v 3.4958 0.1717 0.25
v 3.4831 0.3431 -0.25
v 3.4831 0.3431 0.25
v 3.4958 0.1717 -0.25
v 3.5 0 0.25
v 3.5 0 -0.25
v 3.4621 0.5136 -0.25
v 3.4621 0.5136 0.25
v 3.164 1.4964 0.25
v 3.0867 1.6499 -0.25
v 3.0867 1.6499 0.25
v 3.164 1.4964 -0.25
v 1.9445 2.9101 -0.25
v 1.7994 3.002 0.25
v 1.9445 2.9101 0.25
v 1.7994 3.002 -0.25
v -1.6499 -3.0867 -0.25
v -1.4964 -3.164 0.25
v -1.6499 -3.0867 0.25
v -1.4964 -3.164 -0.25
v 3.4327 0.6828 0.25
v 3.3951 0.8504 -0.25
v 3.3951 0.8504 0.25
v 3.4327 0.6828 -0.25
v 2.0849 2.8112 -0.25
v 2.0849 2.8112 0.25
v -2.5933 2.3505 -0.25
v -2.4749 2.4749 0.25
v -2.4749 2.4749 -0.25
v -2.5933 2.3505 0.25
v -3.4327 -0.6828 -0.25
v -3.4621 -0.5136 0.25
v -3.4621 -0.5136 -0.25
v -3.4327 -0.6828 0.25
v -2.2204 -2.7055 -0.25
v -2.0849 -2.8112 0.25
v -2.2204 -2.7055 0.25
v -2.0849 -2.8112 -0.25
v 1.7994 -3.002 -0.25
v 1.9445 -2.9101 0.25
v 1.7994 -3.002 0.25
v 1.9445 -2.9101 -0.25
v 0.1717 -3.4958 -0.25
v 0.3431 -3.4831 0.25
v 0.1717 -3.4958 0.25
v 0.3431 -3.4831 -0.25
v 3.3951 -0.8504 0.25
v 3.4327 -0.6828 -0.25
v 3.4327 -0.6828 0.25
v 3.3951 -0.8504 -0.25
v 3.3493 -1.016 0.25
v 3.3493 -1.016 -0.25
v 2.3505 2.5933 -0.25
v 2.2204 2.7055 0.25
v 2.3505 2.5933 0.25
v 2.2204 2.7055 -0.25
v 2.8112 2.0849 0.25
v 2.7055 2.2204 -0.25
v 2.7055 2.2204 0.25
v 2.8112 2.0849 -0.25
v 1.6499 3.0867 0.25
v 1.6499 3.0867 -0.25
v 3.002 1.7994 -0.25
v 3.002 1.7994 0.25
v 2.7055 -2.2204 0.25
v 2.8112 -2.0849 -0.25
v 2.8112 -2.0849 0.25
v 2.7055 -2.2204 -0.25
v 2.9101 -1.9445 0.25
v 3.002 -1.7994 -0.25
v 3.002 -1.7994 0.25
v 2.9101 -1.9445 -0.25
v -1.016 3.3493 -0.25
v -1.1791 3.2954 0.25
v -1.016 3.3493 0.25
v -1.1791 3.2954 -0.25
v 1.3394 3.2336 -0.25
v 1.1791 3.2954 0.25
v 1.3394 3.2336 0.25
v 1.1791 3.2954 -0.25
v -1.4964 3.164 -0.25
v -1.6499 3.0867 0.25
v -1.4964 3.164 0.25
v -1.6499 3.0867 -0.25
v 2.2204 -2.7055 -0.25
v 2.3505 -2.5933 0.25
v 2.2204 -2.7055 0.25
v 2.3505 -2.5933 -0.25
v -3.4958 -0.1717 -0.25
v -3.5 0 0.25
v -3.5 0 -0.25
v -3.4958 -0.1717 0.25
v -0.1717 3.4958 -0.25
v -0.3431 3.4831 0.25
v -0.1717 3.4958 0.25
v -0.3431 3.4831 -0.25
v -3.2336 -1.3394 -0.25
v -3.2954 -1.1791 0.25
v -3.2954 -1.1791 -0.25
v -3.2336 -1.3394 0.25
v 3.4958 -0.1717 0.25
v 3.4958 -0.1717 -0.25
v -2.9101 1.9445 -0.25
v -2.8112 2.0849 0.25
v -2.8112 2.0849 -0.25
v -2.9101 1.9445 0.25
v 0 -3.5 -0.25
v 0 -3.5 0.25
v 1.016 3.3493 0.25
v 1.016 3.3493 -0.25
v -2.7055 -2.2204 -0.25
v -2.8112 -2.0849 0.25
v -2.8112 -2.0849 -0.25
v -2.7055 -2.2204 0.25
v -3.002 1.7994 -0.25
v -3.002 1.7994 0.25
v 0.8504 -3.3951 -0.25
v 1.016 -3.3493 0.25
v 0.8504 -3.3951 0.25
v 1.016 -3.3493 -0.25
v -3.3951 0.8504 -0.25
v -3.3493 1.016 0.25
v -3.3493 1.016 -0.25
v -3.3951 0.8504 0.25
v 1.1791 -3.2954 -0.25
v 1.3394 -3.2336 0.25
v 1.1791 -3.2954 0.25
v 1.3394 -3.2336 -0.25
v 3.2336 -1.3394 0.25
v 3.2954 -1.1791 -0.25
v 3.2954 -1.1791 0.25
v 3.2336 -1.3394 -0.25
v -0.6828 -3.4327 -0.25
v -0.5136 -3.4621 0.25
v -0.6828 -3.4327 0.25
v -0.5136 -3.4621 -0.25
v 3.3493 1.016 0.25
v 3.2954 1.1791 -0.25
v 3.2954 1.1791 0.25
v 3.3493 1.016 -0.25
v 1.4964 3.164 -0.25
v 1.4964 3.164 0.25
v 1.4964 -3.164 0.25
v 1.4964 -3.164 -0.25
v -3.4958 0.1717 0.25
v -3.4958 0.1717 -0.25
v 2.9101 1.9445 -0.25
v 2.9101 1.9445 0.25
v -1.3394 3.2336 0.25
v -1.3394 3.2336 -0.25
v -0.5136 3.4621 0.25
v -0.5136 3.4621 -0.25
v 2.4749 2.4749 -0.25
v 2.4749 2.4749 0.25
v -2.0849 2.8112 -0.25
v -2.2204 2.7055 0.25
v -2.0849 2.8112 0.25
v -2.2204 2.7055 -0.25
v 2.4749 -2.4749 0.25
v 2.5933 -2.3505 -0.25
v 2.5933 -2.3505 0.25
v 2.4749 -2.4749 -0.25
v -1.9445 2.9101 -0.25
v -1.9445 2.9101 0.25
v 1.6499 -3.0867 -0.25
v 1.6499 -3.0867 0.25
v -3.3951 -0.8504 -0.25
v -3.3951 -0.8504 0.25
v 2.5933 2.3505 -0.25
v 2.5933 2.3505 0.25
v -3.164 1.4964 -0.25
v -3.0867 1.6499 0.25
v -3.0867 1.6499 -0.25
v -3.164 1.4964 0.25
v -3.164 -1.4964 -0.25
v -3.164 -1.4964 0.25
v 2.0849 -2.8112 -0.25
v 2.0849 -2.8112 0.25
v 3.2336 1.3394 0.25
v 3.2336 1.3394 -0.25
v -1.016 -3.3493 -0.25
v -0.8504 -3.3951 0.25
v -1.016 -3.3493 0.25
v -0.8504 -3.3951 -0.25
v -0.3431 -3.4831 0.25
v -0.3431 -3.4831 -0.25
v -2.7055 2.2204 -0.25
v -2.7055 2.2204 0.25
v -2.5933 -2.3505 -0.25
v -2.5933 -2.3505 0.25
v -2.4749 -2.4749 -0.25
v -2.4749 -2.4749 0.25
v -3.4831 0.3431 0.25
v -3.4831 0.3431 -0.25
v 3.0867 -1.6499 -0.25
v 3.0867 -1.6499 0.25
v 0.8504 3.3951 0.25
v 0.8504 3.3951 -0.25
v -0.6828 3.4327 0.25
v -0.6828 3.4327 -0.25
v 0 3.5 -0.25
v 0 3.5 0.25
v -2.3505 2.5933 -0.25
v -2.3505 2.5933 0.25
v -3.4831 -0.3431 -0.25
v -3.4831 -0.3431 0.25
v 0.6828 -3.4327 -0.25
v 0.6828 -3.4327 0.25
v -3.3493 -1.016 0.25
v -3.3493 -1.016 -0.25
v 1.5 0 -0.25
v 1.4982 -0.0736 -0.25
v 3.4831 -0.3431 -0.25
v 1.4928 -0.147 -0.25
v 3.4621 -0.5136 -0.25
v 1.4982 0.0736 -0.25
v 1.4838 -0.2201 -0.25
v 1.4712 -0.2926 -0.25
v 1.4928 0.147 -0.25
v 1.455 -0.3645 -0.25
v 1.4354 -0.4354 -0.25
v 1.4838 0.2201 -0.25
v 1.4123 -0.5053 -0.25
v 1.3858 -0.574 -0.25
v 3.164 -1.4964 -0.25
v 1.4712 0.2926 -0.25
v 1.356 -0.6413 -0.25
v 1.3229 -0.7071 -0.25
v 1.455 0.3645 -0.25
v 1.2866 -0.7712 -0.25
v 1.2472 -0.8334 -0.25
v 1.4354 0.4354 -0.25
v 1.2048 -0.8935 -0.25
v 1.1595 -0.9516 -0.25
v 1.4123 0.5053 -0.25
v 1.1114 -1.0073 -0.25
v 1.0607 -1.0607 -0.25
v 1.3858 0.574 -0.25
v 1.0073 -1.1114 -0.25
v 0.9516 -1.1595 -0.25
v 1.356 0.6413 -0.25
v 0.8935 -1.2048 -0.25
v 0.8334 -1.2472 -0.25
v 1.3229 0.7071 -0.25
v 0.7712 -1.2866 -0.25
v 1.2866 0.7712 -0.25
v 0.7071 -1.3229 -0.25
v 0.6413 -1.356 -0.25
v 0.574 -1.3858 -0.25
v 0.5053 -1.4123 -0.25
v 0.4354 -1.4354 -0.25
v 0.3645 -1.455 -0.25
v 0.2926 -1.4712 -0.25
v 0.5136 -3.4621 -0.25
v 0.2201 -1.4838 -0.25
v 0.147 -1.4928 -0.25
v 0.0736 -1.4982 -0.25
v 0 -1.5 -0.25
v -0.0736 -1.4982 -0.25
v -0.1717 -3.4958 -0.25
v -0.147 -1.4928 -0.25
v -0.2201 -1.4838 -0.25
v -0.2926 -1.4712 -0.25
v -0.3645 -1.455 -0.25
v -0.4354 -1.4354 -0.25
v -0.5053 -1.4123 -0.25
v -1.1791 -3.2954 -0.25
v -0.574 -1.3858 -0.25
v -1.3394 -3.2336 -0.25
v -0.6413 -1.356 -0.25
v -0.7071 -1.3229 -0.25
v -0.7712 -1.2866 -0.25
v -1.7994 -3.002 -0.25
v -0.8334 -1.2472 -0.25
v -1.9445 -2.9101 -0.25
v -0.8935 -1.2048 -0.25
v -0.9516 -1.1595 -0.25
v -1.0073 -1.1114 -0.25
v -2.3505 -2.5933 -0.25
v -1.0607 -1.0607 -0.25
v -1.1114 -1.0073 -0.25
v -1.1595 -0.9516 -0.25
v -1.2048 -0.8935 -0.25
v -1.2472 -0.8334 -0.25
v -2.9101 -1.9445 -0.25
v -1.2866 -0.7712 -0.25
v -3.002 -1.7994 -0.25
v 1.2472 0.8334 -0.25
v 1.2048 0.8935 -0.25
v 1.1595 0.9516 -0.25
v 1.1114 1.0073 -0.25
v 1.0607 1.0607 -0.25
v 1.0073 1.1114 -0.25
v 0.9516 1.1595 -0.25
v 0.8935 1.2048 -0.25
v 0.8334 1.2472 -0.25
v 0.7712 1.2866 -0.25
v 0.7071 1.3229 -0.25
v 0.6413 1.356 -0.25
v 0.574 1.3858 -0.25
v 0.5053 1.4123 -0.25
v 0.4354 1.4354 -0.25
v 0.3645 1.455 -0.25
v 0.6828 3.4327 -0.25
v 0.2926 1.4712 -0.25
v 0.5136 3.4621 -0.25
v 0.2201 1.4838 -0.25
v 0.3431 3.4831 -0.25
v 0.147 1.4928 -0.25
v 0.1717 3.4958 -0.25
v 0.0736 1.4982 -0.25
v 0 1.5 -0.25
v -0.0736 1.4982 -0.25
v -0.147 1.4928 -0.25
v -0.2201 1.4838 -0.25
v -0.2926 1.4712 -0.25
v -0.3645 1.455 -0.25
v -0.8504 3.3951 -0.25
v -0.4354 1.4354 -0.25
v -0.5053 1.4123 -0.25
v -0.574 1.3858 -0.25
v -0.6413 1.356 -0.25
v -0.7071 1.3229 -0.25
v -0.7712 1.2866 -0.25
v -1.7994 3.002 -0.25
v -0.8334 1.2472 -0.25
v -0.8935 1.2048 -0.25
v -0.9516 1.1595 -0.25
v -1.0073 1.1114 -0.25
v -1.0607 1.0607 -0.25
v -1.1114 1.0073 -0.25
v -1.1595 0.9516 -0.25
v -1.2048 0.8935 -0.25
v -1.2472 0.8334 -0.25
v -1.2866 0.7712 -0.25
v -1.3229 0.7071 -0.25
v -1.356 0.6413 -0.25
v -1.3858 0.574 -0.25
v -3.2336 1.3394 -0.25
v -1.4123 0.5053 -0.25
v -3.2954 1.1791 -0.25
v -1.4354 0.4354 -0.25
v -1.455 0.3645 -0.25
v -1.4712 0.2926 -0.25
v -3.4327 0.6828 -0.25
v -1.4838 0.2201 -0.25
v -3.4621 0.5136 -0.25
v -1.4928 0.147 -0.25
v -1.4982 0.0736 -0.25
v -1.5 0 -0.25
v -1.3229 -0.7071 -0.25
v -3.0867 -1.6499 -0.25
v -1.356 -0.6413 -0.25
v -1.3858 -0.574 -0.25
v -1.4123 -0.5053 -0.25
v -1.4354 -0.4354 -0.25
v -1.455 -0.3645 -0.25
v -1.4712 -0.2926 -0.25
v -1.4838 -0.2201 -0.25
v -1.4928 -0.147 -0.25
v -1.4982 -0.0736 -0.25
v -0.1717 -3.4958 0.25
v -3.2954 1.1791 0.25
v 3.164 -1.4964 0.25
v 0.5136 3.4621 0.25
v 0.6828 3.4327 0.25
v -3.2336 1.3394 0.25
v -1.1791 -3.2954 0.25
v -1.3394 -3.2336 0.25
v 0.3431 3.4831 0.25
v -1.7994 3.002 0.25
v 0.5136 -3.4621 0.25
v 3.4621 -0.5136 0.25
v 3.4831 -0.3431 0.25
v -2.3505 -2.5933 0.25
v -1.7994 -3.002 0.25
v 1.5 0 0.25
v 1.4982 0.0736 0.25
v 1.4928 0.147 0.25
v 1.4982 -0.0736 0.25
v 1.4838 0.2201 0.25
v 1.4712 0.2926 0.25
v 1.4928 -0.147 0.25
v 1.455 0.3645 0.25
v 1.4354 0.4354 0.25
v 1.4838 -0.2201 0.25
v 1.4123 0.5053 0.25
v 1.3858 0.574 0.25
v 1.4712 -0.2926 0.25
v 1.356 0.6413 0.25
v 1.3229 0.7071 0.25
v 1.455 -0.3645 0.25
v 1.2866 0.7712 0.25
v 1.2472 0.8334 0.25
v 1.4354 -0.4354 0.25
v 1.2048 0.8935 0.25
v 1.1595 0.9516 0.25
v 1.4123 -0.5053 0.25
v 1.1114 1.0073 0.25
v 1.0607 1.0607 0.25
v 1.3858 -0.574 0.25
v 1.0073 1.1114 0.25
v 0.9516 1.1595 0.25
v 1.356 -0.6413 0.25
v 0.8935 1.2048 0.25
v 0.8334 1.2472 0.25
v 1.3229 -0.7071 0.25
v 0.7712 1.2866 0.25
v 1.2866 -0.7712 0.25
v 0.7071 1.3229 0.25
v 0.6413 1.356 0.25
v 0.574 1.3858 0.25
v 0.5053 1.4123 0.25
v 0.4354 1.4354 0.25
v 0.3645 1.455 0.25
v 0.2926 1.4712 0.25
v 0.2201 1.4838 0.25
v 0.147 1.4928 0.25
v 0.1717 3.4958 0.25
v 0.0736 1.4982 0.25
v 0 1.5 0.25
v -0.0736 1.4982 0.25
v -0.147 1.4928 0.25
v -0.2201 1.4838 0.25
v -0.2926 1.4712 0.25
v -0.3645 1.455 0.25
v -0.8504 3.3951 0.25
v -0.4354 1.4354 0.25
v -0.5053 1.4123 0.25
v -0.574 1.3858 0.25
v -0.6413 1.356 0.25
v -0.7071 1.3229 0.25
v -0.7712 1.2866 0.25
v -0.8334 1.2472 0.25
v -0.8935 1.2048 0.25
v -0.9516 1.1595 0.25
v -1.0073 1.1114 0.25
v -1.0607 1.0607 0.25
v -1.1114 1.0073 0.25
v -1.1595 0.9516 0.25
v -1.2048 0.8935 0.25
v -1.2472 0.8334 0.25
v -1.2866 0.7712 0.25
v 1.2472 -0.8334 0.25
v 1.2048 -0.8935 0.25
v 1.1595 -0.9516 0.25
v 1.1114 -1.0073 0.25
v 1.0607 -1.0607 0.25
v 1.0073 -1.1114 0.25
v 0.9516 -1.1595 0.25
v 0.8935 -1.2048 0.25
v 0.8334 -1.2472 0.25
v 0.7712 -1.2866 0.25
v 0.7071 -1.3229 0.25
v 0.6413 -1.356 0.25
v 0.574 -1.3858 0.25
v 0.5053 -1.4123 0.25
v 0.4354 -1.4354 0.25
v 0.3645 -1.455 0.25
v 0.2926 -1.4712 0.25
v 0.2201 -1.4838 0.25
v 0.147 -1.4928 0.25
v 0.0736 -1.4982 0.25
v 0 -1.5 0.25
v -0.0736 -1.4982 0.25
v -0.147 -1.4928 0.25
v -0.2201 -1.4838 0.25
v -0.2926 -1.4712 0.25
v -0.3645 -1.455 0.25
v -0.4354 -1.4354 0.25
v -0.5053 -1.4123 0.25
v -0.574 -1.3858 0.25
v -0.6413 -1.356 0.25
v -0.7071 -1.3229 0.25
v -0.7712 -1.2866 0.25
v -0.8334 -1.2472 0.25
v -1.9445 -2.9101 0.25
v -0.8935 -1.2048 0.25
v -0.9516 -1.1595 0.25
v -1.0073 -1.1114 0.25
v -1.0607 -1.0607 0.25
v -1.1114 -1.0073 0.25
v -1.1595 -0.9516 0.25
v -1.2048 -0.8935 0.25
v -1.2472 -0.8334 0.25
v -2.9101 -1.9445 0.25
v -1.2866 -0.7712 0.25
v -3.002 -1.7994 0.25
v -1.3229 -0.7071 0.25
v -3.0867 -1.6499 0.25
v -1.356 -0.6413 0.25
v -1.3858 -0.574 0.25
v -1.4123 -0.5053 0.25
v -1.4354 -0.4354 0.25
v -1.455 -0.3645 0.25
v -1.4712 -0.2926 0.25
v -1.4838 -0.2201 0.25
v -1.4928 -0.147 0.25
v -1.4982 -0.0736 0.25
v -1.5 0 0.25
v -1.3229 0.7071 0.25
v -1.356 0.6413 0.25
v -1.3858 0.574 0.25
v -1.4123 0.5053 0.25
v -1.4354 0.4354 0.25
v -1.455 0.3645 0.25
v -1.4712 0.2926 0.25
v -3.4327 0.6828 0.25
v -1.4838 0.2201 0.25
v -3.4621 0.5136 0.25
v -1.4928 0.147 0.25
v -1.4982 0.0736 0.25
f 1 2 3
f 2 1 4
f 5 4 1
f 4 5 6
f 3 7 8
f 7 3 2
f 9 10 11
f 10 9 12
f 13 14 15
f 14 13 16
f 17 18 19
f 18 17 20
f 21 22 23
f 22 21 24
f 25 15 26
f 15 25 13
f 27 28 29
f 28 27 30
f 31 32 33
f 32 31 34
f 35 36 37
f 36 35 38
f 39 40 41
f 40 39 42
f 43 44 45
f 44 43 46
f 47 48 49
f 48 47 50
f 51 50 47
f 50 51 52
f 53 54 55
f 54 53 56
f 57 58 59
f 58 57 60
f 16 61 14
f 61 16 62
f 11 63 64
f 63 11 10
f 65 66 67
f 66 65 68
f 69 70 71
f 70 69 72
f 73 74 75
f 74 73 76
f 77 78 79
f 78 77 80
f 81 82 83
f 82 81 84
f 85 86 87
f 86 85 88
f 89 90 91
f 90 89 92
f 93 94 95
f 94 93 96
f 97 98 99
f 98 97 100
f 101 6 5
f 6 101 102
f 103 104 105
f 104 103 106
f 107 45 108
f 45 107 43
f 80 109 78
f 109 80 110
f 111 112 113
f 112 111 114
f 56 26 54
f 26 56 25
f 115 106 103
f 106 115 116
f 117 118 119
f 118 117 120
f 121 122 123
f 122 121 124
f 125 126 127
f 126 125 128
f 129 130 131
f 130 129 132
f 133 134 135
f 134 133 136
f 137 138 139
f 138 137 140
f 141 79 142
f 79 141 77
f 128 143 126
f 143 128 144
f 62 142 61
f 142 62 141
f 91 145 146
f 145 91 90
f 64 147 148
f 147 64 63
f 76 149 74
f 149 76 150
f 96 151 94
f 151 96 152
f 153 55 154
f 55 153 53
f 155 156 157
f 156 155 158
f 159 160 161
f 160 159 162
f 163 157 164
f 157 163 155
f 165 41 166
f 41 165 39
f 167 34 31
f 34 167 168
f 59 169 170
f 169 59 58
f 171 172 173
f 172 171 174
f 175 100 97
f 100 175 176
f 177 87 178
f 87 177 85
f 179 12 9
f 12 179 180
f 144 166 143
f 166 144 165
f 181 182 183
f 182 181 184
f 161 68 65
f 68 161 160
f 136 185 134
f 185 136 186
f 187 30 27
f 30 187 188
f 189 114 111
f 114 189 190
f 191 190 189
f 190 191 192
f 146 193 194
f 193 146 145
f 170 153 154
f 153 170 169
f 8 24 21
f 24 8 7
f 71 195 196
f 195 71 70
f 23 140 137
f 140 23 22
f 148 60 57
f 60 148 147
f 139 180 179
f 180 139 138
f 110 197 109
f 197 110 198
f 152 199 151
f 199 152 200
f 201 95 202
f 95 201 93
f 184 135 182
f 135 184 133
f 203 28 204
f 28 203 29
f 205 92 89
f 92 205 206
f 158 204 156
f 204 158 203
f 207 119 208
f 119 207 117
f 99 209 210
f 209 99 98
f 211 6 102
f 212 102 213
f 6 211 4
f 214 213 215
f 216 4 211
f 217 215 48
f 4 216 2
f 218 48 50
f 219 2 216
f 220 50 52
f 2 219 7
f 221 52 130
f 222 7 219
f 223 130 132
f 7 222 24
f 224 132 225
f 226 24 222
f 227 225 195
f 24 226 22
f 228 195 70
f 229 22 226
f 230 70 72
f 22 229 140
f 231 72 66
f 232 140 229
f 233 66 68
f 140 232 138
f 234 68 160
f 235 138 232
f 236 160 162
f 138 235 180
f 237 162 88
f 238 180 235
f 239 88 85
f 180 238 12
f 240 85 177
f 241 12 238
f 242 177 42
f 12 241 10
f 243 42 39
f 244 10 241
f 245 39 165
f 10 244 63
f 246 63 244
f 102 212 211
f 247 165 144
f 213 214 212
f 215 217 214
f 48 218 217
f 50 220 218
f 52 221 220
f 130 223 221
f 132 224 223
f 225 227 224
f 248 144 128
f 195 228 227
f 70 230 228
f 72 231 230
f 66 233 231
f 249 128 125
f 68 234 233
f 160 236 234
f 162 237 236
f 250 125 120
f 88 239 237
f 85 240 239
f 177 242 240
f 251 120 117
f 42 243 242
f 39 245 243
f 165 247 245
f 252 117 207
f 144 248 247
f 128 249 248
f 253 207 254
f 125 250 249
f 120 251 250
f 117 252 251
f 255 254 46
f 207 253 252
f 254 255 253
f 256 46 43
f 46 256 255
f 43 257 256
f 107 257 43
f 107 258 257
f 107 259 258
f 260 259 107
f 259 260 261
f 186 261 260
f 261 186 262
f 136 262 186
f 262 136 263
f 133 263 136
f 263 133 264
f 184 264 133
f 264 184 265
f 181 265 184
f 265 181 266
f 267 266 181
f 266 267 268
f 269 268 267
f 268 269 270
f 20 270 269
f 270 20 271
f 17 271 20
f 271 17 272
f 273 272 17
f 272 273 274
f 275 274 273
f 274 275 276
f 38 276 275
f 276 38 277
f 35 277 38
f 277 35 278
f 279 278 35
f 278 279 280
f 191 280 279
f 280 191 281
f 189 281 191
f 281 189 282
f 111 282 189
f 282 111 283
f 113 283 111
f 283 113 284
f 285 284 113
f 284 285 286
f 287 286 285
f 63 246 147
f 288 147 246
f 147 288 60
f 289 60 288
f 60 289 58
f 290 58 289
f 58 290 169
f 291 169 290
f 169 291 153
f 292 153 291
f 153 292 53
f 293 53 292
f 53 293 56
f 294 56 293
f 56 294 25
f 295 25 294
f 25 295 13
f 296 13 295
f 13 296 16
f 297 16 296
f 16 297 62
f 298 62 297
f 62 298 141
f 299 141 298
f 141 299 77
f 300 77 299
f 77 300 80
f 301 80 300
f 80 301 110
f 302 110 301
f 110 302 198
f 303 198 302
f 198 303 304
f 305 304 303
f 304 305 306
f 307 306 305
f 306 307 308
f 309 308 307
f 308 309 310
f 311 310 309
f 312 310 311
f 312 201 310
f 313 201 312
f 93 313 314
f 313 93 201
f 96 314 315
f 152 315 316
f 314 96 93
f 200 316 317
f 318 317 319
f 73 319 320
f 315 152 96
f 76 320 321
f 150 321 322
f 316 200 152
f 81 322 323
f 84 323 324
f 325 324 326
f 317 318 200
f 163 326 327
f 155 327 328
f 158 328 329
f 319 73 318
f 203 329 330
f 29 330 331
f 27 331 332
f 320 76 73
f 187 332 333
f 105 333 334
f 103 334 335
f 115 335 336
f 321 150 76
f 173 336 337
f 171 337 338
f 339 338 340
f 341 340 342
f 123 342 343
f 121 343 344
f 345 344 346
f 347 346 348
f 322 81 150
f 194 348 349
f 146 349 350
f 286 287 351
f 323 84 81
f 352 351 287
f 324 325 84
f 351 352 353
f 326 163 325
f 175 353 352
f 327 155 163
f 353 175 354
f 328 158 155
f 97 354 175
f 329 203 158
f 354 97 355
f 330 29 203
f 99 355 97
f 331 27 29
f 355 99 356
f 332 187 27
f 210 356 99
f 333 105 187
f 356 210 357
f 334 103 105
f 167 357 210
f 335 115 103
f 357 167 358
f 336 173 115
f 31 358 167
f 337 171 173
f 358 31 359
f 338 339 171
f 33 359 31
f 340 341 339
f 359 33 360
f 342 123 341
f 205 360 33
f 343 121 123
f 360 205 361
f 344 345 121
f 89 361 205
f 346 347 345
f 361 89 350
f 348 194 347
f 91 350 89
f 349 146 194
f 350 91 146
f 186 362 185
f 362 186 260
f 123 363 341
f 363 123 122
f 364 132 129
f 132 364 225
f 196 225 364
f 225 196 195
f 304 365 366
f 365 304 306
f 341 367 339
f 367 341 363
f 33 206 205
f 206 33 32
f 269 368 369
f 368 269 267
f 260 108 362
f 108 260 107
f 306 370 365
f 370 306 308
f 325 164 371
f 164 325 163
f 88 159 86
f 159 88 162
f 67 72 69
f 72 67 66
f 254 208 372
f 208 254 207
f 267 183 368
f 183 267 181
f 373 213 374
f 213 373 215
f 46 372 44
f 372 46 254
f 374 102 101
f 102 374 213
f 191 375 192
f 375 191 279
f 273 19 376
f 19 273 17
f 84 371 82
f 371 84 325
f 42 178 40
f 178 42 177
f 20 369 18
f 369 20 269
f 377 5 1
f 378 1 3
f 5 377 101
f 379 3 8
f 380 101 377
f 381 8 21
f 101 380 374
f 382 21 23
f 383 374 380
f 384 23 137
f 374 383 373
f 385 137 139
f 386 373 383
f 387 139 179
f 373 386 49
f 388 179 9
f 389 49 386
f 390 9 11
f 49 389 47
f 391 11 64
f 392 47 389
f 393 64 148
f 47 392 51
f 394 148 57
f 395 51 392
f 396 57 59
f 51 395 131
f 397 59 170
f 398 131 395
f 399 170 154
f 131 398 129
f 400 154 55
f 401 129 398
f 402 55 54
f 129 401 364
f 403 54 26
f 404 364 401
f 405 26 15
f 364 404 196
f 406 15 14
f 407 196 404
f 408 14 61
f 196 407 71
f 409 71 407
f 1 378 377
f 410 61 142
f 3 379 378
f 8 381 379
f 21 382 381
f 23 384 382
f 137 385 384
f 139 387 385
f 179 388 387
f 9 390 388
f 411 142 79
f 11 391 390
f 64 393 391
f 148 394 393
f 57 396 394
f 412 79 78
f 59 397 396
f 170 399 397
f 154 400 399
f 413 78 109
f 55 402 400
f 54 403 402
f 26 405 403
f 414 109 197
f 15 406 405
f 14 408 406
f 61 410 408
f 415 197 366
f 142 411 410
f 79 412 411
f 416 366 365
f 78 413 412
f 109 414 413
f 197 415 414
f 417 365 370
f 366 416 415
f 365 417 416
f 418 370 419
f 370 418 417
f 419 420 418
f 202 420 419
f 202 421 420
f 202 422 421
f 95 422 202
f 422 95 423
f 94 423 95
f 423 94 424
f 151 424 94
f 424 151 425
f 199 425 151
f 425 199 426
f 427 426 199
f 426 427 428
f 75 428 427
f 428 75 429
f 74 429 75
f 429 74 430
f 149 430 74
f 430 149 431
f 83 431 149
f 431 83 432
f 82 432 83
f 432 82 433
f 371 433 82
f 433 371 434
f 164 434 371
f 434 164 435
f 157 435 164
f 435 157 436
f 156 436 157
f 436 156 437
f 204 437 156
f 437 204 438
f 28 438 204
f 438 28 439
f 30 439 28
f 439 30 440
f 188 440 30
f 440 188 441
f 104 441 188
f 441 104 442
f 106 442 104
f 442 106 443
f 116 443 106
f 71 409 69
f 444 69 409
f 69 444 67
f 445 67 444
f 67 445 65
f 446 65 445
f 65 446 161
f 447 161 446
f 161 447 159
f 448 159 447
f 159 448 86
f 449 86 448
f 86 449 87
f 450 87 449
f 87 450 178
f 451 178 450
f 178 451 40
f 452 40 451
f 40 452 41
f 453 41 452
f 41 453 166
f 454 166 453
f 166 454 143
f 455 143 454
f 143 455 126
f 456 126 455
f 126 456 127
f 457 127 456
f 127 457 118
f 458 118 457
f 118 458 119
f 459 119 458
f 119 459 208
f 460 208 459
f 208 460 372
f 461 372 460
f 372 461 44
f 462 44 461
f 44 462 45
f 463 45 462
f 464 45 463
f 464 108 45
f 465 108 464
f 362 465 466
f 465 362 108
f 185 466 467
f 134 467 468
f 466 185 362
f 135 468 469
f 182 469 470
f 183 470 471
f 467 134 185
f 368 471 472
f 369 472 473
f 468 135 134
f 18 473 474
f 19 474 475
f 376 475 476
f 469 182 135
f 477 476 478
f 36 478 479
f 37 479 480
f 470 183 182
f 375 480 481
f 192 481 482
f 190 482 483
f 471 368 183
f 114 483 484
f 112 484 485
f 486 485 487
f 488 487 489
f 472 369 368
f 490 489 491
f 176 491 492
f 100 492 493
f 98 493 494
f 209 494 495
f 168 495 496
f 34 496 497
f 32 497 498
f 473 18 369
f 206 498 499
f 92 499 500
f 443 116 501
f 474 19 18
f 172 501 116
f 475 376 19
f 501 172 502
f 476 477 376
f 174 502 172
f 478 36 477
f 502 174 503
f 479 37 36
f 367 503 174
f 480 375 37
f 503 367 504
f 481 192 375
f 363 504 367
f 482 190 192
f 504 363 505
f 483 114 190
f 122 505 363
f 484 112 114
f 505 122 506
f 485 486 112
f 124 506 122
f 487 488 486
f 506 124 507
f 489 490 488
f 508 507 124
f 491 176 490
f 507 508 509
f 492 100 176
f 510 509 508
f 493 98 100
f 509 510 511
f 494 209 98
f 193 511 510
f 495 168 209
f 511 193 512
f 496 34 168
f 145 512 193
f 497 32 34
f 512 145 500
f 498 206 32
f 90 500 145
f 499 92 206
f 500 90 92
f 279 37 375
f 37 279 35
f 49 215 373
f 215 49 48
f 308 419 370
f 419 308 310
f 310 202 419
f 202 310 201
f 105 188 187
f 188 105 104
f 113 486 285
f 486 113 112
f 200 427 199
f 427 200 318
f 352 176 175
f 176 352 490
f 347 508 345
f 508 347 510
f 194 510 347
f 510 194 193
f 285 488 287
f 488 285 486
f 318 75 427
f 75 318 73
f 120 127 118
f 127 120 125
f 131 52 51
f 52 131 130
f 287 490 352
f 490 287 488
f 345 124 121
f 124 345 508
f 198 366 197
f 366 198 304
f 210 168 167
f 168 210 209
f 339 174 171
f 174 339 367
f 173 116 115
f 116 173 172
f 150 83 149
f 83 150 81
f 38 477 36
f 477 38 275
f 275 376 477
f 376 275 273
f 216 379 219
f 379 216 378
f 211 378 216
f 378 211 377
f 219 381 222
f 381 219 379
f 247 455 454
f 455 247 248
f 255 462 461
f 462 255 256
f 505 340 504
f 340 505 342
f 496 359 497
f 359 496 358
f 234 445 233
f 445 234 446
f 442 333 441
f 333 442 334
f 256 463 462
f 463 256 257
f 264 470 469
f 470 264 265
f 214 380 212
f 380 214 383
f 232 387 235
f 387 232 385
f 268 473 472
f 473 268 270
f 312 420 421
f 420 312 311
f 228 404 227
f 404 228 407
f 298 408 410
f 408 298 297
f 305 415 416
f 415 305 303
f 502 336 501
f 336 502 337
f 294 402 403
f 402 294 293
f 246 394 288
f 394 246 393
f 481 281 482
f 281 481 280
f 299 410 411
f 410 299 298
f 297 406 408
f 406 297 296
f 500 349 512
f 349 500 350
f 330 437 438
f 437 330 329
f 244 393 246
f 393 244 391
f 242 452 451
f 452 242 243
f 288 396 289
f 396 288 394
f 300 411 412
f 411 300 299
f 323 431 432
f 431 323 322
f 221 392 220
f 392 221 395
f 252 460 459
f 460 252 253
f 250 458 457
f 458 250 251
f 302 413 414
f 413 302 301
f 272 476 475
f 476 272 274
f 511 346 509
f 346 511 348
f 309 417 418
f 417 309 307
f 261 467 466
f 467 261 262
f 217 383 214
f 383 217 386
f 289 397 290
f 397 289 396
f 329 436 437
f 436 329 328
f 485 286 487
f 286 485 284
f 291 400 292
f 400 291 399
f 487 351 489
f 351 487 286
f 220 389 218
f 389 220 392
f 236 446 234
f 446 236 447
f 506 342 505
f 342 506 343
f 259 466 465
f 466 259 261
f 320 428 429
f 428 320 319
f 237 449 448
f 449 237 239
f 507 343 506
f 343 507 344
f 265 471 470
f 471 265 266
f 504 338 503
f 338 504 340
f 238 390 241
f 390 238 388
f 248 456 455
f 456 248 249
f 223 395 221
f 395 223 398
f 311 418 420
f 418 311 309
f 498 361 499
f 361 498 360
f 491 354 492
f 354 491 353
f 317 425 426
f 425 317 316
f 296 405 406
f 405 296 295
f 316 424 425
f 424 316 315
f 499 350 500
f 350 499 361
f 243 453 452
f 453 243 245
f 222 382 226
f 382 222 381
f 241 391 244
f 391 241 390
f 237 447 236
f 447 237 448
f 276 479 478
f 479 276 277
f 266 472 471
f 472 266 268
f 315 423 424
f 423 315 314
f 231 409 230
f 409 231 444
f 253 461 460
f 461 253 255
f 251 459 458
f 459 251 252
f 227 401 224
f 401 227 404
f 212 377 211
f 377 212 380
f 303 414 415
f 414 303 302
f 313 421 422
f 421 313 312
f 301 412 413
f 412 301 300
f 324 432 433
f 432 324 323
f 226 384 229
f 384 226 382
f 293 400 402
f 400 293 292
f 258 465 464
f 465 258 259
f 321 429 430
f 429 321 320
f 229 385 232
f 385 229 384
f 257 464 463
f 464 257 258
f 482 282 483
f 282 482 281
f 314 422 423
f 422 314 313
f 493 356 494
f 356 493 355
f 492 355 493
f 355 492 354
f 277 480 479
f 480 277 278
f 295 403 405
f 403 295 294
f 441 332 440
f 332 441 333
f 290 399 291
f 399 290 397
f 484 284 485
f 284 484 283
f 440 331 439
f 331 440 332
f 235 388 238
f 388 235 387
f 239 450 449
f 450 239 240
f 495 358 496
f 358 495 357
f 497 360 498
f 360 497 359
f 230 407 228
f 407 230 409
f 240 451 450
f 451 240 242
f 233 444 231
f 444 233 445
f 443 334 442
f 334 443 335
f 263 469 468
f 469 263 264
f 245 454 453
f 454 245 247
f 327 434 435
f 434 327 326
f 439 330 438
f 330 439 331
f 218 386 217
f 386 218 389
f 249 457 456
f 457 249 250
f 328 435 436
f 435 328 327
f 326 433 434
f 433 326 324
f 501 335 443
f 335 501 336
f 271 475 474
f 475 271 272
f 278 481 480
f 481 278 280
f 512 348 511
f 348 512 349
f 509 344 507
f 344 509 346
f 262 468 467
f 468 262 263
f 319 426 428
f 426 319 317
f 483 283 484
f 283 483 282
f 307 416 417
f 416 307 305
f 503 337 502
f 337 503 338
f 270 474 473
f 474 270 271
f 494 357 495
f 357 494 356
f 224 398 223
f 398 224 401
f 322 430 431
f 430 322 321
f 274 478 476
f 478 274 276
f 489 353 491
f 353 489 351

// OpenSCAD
// Flat washer parameters (mm)
inner_diameter_mm = 3.0;   // 3.0mm hole
outer_diameter_mm = 7.0;   // 7.0mm OD
thickness_mm      = 0.5;   // 0.5mm thick
eps_mm            = 0.05;  // small clearance for clean boolean

$fn = 128;

difference() {
    cylinder(d=outer_diameter_mm, h=thickness_mm, center=true);
    cylinder(d=inner_diameter_mm, h=thickness_mm + 2*eps_mm, center=true);
}
